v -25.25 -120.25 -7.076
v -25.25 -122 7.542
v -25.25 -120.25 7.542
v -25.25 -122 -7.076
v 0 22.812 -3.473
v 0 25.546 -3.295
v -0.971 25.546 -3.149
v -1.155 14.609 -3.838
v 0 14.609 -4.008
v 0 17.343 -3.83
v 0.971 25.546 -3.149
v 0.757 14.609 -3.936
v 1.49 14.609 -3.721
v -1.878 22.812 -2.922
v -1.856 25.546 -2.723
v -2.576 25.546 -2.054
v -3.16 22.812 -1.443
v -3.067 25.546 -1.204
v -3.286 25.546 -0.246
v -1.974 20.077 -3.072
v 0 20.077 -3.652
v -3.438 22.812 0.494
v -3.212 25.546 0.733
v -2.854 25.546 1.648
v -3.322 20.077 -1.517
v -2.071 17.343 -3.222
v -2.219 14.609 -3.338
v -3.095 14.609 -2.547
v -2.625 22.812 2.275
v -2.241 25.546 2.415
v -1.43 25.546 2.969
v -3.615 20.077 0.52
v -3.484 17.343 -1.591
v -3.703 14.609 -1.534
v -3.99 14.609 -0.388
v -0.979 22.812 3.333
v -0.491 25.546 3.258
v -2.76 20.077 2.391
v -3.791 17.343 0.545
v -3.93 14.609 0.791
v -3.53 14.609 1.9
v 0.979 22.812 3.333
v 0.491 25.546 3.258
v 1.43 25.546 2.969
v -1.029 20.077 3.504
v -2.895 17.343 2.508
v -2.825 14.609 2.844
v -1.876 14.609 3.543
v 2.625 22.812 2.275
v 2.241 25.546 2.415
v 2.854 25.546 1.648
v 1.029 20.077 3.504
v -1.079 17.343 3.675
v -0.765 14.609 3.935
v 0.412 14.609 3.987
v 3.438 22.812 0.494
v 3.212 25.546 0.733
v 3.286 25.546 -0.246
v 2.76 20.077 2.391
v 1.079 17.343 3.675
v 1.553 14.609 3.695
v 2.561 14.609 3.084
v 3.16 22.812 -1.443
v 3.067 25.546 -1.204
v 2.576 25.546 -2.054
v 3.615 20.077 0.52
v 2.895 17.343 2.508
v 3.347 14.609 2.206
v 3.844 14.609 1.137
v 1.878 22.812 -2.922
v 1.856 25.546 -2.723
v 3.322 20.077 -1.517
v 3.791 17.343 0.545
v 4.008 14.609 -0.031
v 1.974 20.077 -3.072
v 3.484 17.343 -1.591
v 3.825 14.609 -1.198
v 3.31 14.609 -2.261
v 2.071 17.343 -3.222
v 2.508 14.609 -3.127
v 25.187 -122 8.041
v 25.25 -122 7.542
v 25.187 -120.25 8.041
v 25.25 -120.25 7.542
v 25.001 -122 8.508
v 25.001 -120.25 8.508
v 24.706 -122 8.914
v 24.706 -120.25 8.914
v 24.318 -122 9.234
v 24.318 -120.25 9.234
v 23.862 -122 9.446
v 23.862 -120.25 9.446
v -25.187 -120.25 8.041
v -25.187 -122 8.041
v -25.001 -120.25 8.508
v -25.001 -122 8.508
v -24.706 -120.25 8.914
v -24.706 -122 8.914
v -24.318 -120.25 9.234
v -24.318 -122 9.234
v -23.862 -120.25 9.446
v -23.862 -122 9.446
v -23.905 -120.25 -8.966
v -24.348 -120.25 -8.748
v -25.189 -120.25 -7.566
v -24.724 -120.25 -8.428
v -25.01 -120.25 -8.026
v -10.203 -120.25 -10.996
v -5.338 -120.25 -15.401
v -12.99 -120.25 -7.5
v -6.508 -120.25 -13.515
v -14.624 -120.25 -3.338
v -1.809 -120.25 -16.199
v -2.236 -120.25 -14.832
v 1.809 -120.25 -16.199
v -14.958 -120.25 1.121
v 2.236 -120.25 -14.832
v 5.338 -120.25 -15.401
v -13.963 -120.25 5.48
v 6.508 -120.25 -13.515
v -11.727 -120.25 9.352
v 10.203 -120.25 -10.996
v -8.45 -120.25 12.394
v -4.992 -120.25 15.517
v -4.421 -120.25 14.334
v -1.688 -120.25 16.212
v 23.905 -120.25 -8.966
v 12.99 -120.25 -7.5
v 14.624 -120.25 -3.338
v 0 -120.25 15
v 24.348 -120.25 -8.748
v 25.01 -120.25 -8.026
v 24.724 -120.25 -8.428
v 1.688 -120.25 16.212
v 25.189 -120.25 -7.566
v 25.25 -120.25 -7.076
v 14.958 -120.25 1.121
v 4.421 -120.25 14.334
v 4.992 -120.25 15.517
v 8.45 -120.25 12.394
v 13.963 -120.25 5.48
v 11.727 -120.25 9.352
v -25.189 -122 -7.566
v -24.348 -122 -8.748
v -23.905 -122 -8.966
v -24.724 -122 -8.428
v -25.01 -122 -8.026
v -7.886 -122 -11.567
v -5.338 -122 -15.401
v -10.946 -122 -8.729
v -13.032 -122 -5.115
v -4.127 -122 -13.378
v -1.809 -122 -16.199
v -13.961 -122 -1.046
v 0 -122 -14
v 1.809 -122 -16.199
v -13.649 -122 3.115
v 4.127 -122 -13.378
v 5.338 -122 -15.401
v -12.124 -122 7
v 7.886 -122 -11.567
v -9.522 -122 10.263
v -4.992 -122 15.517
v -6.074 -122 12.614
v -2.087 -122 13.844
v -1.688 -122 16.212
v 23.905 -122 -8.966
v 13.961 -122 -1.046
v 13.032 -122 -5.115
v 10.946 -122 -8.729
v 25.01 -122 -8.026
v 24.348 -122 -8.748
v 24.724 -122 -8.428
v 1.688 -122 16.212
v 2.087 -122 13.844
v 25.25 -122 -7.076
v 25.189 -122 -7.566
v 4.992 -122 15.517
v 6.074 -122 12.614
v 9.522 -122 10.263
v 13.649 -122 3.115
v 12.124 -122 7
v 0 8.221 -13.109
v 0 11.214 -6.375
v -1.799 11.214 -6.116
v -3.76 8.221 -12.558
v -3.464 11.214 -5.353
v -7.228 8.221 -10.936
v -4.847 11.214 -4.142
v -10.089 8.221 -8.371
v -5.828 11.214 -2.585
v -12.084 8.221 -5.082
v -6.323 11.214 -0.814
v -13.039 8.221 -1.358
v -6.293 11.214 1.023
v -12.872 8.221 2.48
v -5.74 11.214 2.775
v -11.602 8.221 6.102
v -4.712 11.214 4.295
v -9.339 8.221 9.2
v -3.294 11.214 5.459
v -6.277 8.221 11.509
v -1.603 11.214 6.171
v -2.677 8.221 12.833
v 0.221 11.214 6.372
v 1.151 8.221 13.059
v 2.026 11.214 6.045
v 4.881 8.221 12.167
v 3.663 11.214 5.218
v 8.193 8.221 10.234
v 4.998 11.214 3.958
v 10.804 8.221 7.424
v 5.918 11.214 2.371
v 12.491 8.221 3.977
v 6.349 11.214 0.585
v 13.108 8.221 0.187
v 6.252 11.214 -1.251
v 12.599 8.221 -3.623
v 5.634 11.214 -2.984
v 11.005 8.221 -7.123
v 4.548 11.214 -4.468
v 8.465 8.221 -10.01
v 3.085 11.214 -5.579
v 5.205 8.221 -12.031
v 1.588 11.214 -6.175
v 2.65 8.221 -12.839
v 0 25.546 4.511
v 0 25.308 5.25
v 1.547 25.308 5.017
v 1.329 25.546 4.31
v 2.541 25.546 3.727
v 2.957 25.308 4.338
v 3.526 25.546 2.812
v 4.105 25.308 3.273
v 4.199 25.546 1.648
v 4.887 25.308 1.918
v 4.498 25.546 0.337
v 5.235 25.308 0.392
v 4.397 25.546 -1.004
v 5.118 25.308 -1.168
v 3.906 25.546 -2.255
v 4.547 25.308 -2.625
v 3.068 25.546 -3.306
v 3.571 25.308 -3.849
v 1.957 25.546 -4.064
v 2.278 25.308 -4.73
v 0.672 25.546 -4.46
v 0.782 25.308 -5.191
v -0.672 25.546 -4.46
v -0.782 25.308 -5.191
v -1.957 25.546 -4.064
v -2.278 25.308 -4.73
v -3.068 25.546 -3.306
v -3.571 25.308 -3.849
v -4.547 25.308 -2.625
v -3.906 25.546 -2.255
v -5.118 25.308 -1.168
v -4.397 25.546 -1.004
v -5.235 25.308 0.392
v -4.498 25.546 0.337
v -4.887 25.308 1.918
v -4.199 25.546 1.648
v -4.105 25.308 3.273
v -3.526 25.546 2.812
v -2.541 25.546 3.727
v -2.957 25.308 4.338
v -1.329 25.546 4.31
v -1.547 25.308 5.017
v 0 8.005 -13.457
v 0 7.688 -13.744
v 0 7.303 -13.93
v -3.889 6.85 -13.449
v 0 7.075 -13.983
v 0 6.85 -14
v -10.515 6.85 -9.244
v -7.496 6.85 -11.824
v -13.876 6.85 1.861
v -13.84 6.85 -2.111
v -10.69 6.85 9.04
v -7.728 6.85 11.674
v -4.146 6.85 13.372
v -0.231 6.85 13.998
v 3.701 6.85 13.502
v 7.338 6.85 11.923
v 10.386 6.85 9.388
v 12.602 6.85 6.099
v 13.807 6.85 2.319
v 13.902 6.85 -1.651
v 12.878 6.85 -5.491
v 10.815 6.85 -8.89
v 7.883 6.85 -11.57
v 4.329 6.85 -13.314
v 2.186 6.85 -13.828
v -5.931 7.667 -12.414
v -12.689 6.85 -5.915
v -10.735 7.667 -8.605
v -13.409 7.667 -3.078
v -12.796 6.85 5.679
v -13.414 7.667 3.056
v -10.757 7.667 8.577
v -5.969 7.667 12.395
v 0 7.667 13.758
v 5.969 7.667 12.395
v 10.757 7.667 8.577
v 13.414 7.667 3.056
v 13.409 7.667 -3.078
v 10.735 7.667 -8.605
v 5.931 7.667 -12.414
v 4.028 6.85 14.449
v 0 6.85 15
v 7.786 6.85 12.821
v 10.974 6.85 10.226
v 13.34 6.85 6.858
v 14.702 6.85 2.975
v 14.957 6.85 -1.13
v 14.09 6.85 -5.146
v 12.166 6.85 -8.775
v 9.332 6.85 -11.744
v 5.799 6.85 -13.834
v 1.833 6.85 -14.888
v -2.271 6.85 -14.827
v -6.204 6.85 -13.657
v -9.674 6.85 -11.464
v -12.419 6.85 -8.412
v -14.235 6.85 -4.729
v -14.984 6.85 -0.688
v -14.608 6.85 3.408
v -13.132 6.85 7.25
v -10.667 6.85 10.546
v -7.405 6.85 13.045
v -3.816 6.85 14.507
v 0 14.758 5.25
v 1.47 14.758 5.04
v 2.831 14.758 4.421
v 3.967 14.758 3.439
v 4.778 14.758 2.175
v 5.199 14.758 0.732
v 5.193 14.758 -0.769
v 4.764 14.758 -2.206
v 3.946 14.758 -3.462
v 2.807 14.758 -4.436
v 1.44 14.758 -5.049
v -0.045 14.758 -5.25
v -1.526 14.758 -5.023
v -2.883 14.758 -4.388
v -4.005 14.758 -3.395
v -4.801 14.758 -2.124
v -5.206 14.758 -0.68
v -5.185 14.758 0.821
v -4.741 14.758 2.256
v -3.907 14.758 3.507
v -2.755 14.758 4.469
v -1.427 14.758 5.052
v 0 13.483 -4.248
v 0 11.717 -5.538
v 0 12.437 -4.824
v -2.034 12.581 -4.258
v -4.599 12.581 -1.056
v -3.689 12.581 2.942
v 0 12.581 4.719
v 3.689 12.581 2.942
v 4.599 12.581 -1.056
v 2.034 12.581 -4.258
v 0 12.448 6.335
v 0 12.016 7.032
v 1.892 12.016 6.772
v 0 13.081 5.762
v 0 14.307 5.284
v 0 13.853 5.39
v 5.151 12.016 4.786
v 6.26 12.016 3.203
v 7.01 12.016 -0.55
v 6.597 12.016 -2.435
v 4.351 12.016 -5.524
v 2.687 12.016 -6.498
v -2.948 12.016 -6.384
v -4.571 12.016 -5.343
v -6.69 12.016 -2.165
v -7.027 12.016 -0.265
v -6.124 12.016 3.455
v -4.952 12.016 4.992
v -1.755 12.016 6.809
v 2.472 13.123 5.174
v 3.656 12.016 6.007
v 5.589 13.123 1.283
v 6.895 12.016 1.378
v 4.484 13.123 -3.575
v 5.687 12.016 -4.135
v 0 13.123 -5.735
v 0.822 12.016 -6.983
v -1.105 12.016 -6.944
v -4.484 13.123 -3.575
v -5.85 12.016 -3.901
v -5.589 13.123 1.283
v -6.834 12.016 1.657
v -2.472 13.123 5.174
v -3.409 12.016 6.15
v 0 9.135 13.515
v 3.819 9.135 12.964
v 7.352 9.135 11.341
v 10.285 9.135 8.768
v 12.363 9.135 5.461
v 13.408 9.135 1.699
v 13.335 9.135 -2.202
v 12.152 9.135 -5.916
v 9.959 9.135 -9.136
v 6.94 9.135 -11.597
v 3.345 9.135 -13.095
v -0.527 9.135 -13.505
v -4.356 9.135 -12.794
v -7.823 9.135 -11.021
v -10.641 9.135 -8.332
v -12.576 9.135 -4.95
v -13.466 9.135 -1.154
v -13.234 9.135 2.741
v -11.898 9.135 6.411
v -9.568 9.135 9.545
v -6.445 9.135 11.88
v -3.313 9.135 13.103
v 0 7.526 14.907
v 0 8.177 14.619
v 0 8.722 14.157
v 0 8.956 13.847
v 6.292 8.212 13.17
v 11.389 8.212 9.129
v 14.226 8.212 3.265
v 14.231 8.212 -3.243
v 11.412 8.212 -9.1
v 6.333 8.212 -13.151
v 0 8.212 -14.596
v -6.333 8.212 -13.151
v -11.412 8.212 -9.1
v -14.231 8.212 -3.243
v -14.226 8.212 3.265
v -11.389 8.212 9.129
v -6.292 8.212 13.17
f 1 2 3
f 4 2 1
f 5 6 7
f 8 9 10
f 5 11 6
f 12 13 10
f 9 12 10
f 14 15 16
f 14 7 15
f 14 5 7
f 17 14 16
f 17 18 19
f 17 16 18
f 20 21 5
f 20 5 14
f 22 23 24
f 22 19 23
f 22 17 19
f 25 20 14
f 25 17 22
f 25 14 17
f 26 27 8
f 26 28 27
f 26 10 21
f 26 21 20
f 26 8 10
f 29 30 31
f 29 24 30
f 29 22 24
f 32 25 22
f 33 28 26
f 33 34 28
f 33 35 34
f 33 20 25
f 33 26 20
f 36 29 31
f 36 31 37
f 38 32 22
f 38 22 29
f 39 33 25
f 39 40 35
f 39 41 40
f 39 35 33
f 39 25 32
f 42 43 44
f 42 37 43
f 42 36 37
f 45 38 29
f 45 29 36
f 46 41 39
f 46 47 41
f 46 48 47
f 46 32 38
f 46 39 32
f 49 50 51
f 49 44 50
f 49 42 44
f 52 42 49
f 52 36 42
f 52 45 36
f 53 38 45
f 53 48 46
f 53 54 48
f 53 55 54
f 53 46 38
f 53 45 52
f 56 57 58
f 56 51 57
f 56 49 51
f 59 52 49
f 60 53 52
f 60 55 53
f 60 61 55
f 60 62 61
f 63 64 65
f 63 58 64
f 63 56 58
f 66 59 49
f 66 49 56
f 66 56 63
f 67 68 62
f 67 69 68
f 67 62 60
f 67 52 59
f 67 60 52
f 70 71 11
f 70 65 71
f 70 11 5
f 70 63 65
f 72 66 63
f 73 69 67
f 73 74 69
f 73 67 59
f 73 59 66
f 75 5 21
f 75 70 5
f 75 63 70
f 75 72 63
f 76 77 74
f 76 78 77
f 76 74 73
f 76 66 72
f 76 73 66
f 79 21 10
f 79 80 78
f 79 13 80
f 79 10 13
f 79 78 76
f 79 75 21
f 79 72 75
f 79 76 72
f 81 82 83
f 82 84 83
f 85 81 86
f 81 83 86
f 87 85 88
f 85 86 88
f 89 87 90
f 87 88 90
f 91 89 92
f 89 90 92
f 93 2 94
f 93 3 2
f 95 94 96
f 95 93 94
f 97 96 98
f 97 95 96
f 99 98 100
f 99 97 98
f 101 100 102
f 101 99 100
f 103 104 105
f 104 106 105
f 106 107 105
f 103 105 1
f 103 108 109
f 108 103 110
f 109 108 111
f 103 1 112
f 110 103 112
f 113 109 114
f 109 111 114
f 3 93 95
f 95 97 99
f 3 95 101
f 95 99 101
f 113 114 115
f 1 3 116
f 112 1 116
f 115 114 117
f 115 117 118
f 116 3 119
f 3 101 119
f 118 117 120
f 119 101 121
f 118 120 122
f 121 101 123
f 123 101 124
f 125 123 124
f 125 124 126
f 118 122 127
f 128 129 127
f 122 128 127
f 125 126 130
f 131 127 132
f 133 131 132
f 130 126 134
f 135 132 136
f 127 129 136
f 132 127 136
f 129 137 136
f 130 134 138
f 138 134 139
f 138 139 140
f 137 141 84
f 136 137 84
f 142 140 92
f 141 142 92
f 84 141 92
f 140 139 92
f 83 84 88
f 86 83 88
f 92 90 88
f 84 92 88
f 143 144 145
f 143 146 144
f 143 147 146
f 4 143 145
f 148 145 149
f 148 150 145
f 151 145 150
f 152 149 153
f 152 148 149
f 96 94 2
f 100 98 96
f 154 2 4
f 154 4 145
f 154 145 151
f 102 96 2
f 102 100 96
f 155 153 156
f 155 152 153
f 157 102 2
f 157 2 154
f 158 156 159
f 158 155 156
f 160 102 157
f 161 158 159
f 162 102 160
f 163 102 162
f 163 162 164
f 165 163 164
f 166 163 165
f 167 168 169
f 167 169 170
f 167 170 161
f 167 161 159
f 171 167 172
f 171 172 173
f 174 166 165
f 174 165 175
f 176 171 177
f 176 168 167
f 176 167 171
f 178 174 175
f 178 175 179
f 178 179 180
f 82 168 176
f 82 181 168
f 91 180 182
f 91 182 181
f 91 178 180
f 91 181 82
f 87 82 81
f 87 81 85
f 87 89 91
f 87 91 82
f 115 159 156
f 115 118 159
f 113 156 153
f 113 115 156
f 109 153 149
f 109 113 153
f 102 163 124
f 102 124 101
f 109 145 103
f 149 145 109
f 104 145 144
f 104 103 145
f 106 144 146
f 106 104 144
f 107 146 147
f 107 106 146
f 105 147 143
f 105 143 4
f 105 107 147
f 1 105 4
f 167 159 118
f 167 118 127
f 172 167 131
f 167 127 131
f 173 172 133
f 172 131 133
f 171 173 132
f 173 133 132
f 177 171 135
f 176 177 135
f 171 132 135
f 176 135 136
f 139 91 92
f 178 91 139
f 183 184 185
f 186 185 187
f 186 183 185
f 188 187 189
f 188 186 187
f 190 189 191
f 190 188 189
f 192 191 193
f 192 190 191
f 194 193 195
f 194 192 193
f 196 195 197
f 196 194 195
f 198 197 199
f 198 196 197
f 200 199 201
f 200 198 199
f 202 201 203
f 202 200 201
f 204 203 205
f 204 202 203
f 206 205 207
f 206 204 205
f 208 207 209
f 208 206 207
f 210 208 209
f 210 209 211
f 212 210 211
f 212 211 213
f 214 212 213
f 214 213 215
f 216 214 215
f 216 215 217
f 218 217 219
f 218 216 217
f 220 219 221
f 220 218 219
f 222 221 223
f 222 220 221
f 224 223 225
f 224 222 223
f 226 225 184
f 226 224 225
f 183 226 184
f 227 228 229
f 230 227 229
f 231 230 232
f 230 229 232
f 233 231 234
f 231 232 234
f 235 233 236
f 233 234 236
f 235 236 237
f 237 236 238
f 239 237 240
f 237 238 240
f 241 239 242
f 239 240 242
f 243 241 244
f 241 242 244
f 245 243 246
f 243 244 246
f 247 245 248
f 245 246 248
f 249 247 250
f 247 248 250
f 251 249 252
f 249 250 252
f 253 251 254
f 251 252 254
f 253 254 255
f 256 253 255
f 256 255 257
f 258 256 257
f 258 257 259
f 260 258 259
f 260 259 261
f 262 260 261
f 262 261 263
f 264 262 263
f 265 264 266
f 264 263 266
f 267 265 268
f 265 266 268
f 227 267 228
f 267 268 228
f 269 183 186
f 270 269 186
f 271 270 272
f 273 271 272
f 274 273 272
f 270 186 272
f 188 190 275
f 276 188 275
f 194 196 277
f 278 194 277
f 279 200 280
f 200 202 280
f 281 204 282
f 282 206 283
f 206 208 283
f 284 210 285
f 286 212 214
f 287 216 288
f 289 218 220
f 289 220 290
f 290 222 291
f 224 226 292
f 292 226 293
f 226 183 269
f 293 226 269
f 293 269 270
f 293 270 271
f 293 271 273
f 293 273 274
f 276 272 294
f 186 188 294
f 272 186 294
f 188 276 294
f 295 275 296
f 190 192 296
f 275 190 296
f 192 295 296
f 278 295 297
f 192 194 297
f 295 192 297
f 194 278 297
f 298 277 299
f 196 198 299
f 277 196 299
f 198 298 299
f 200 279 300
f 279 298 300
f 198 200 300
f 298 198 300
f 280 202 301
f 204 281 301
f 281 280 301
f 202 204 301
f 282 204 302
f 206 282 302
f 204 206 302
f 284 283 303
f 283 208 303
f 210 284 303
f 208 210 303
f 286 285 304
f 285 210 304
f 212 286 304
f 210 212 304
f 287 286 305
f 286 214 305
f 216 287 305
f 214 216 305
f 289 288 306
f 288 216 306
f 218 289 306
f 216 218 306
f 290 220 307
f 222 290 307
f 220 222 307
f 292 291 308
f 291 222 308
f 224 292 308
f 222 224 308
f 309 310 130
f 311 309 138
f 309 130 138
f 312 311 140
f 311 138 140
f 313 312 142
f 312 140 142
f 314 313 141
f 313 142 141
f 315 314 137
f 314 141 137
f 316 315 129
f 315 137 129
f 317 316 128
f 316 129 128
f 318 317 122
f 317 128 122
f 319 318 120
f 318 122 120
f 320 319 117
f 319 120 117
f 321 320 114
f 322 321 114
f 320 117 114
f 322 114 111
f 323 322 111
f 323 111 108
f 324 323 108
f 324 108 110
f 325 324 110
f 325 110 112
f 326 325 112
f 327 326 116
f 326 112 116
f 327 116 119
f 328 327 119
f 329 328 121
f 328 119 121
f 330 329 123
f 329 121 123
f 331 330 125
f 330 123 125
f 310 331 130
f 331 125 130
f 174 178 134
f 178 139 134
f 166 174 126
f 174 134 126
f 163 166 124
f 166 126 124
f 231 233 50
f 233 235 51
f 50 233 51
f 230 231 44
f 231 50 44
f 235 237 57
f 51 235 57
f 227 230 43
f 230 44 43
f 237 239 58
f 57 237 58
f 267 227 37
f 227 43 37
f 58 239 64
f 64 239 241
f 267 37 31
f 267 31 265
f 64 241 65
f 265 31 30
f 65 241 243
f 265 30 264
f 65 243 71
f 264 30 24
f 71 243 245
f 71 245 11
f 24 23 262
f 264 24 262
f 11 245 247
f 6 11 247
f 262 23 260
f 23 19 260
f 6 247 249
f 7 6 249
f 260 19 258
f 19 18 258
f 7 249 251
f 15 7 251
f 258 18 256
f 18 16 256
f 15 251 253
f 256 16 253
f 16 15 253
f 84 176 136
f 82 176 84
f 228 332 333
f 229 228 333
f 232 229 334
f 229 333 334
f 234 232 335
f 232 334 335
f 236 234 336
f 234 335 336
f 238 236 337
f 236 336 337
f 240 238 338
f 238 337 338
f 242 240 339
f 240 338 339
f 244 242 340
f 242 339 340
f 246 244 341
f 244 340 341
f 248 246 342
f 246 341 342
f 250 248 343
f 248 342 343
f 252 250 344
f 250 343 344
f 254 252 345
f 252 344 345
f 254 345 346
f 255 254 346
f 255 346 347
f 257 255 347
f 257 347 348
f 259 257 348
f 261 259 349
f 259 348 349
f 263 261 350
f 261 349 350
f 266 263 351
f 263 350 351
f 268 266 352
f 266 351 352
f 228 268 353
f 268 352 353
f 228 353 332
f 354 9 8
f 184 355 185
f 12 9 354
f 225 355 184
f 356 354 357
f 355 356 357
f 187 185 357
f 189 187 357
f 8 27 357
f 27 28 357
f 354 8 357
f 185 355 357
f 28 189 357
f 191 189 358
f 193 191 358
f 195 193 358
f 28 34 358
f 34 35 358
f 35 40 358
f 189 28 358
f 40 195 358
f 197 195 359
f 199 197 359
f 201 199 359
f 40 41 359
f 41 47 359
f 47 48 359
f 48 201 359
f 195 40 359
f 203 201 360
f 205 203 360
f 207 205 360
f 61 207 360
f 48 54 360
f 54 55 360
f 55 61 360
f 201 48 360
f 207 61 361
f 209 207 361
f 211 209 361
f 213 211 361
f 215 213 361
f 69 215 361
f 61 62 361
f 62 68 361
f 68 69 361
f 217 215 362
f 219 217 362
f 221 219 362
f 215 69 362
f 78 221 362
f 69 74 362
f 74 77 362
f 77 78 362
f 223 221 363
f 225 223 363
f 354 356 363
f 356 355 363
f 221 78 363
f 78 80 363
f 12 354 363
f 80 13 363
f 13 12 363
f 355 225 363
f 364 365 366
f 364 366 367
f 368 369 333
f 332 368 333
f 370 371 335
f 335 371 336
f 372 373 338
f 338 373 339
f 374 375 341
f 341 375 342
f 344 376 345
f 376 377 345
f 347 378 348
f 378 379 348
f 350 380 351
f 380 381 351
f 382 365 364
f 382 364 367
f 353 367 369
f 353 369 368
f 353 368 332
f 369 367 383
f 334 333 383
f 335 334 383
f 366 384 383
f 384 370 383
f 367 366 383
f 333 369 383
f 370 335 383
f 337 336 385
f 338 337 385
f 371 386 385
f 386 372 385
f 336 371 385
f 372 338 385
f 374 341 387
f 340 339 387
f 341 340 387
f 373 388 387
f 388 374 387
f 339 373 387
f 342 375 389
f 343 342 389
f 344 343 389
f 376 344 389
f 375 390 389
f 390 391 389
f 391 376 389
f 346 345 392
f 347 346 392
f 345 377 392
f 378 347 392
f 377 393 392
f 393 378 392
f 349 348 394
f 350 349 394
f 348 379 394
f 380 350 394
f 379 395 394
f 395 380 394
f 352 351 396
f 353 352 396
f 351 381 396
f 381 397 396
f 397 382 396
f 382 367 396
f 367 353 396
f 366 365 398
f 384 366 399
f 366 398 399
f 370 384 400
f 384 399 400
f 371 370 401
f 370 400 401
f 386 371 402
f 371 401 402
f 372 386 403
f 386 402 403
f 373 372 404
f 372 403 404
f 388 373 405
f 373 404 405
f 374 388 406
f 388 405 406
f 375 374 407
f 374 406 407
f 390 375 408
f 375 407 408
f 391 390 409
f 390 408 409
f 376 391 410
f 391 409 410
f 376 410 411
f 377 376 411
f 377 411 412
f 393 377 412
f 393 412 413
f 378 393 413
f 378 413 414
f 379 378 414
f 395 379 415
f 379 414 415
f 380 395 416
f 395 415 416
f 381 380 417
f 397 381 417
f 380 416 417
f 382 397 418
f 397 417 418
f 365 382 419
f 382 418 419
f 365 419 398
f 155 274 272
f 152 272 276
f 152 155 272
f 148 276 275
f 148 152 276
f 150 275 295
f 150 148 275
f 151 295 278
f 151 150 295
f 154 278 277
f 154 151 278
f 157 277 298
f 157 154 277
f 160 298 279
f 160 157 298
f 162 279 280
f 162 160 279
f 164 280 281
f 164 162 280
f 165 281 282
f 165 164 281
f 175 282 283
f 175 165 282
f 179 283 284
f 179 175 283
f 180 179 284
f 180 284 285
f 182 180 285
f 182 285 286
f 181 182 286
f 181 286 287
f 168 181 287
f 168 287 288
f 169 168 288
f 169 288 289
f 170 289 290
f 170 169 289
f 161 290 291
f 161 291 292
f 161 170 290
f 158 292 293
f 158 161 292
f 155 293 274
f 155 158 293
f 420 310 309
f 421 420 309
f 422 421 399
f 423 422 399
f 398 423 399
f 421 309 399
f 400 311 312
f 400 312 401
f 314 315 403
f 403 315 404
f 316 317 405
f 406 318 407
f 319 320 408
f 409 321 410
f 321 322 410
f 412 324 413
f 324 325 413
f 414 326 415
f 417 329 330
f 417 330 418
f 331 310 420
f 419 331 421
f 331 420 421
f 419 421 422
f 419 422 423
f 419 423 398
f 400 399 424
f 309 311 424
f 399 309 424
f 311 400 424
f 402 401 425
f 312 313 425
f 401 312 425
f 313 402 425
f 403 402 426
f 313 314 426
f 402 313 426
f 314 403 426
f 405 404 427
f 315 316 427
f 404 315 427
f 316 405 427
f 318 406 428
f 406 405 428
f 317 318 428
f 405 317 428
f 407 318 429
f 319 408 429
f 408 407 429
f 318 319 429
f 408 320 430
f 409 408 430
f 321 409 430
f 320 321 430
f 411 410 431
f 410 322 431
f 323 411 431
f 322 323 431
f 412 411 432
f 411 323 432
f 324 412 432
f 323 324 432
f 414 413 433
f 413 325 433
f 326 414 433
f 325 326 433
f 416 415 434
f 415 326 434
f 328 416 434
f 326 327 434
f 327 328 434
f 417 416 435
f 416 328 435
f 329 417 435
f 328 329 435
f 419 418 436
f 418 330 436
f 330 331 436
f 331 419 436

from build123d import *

# Parameters (mm, degrees)
BOSS_EXTRUDE1_DEPTH = 1.75
FILLET1_R           = 1
FILLET2_R           = 1.5
FILLET3_R           = 2
FILLET4_R           = 2.5
FILLET5_R           = 3
FILLET6_R           = 4
FILLET7_R           = 16.3
CUT_EXTRUDE1_REACH  = 152.576
SKETCH4_R           = 17.447294951


with BuildPart() as part:
    # Sketch1 → Boss-Extrude1 (new body)
    with BuildSketch(Plane.XZ.offset(122.00000003)):
        Polygon((0, -17.251221002), (25.25, -8.499999866), (25.25, 9.000000134), (0, 17.122631398), (-25.25, 9.000000134), (-25.25, -8.499999866), align=None)
    extrude(amount=-BOSS_EXTRUDE1_DEPTH)

    # Sketch2 → Revolve1 (revolve)
    with BuildSketch(Plane(origin=(0, 0, 0), x_dir=(-1, 0, 0), z_dir=(0, 0, -1)), mode=Mode.PRIVATE) as revolve1_sk:
        Polygon((-15.000000104, -120.25000003), (0, -120.25000003), (0, 50.000000745), (-3.000000045, 50.000000745), (-4.510515864, 25.545941813), (-5.250000063, 25.308142899), (-5.250000063, 12.808142939), (-15.000000104, 8.474809587), align=None)
    revolve(revolve1_sk.sketch.rotate(Axis((0, -120.25000003, 0), (0, 1, 0)), 270), axis=Axis((0, -120.25000003, 0), (0, 1, 0)))

    # Sketch3 → Cut-Revolve1 (revolve, cut)
    with BuildSketch(Plane(origin=(0, 0, 0), x_dir=(-1, 0, 0), z_dir=(0, 0, -1)), mode=Mode.PRIVATE) as cut_revolve1_sk:
        Polygon((-14.00000011, -122.00000003), (0, -122.00000003), (0, 50.000000745), (-1.700000001, 50.000000745), (-4.165865434, 12.195663018), (-14.00000011, 7.824936496), align=None)
    revolve(cut_revolve1_sk.sketch.rotate(Axis((0, -122.00000003, 0), (0, 1, 0)), 90), axis=Axis((0, -122.00000003, 0), (0, 1, 0)), mode=Mode.SUBTRACT)

    # Fillet1
    fillet1_edges = [part.edges().sort_by_distance(p)[0] for p in [
        (0, 50.000000745, -3.000000045),
    ]]
    fillet(fillet1_edges, radius=FILLET1_R)

    # Fillet2
    fillet2_edges = [part.edges().sort_by_distance(p)[0] for p in [
        (0, 7.824936496, 14.00000011),
    ]]
    fillet(fillet2_edges, radius=FILLET2_R)

    # Fillet3
    fillet3_edges = [part.edges().sort_by_distance(p)[0] for p in [
        (-25.25, -121.12500003, -8.499999866),
        (-25.25, -121.12500003, 9.000000134),
        (25.25, -121.12500003, 9.000000134),
        (25.25, -121.12500003, -8.499999866),
    ]]
    fillet(fillet3_edges, radius=FILLET3_R)

    # Fillet4
    fillet4_edges = [part.edges().sort_by_distance(p)[0] for p in [
        (0, 8.474809587, -15.000000104),
    ]]
    fillet(fillet4_edges, radius=FILLET4_R)

    # Fillet5
    fillet5_edges = [part.edges().sort_by_distance(p)[0] for p in [
        (0, 12.808142939, -5.250000063),
    ]]
    fillet(fillet5_edges, radius=FILLET5_R)

    # Fillet6
    fillet6_edges = [part.edges().sort_by_distance(p)[0] for p in [
        (0, 12.195663018, 4.165865434),
    ]]
    fillet(fillet6_edges, radius=FILLET6_R)

    # Fillet7
    fillet7_edges = [part.edges().sort_by_distance(p)[0] for p in [
        (0, -121.12500003, 17.122631398),
        (0, -121.12500003, -17.251221002),
    ]]
    fillet(fillet7_edges, radius=FILLET7_R)

    # Sketch4 → Cut-Extrude1 (cut, up to next)
    with BuildSketch(Plane(origin=(0, 25.545941813, 0), x_dir=(-1, 0, 0), z_dir=(0, -1, 0)), mode=Mode.PRIVATE) as cut_extrude1_sk1:
        Circle(SKETCH4_R)
    cut_extrude1_tool1 = extrude(cut_extrude1_sk1.sketch, amount=-CUT_EXTRUDE1_REACH, mode=Mode.PRIVATE) & part.part
    add(cut_extrude1_tool1.solids().sort_by_distance((0, 25.545942, 0))[0], mode=Mode.SUBTRACT)


solid = part.part
